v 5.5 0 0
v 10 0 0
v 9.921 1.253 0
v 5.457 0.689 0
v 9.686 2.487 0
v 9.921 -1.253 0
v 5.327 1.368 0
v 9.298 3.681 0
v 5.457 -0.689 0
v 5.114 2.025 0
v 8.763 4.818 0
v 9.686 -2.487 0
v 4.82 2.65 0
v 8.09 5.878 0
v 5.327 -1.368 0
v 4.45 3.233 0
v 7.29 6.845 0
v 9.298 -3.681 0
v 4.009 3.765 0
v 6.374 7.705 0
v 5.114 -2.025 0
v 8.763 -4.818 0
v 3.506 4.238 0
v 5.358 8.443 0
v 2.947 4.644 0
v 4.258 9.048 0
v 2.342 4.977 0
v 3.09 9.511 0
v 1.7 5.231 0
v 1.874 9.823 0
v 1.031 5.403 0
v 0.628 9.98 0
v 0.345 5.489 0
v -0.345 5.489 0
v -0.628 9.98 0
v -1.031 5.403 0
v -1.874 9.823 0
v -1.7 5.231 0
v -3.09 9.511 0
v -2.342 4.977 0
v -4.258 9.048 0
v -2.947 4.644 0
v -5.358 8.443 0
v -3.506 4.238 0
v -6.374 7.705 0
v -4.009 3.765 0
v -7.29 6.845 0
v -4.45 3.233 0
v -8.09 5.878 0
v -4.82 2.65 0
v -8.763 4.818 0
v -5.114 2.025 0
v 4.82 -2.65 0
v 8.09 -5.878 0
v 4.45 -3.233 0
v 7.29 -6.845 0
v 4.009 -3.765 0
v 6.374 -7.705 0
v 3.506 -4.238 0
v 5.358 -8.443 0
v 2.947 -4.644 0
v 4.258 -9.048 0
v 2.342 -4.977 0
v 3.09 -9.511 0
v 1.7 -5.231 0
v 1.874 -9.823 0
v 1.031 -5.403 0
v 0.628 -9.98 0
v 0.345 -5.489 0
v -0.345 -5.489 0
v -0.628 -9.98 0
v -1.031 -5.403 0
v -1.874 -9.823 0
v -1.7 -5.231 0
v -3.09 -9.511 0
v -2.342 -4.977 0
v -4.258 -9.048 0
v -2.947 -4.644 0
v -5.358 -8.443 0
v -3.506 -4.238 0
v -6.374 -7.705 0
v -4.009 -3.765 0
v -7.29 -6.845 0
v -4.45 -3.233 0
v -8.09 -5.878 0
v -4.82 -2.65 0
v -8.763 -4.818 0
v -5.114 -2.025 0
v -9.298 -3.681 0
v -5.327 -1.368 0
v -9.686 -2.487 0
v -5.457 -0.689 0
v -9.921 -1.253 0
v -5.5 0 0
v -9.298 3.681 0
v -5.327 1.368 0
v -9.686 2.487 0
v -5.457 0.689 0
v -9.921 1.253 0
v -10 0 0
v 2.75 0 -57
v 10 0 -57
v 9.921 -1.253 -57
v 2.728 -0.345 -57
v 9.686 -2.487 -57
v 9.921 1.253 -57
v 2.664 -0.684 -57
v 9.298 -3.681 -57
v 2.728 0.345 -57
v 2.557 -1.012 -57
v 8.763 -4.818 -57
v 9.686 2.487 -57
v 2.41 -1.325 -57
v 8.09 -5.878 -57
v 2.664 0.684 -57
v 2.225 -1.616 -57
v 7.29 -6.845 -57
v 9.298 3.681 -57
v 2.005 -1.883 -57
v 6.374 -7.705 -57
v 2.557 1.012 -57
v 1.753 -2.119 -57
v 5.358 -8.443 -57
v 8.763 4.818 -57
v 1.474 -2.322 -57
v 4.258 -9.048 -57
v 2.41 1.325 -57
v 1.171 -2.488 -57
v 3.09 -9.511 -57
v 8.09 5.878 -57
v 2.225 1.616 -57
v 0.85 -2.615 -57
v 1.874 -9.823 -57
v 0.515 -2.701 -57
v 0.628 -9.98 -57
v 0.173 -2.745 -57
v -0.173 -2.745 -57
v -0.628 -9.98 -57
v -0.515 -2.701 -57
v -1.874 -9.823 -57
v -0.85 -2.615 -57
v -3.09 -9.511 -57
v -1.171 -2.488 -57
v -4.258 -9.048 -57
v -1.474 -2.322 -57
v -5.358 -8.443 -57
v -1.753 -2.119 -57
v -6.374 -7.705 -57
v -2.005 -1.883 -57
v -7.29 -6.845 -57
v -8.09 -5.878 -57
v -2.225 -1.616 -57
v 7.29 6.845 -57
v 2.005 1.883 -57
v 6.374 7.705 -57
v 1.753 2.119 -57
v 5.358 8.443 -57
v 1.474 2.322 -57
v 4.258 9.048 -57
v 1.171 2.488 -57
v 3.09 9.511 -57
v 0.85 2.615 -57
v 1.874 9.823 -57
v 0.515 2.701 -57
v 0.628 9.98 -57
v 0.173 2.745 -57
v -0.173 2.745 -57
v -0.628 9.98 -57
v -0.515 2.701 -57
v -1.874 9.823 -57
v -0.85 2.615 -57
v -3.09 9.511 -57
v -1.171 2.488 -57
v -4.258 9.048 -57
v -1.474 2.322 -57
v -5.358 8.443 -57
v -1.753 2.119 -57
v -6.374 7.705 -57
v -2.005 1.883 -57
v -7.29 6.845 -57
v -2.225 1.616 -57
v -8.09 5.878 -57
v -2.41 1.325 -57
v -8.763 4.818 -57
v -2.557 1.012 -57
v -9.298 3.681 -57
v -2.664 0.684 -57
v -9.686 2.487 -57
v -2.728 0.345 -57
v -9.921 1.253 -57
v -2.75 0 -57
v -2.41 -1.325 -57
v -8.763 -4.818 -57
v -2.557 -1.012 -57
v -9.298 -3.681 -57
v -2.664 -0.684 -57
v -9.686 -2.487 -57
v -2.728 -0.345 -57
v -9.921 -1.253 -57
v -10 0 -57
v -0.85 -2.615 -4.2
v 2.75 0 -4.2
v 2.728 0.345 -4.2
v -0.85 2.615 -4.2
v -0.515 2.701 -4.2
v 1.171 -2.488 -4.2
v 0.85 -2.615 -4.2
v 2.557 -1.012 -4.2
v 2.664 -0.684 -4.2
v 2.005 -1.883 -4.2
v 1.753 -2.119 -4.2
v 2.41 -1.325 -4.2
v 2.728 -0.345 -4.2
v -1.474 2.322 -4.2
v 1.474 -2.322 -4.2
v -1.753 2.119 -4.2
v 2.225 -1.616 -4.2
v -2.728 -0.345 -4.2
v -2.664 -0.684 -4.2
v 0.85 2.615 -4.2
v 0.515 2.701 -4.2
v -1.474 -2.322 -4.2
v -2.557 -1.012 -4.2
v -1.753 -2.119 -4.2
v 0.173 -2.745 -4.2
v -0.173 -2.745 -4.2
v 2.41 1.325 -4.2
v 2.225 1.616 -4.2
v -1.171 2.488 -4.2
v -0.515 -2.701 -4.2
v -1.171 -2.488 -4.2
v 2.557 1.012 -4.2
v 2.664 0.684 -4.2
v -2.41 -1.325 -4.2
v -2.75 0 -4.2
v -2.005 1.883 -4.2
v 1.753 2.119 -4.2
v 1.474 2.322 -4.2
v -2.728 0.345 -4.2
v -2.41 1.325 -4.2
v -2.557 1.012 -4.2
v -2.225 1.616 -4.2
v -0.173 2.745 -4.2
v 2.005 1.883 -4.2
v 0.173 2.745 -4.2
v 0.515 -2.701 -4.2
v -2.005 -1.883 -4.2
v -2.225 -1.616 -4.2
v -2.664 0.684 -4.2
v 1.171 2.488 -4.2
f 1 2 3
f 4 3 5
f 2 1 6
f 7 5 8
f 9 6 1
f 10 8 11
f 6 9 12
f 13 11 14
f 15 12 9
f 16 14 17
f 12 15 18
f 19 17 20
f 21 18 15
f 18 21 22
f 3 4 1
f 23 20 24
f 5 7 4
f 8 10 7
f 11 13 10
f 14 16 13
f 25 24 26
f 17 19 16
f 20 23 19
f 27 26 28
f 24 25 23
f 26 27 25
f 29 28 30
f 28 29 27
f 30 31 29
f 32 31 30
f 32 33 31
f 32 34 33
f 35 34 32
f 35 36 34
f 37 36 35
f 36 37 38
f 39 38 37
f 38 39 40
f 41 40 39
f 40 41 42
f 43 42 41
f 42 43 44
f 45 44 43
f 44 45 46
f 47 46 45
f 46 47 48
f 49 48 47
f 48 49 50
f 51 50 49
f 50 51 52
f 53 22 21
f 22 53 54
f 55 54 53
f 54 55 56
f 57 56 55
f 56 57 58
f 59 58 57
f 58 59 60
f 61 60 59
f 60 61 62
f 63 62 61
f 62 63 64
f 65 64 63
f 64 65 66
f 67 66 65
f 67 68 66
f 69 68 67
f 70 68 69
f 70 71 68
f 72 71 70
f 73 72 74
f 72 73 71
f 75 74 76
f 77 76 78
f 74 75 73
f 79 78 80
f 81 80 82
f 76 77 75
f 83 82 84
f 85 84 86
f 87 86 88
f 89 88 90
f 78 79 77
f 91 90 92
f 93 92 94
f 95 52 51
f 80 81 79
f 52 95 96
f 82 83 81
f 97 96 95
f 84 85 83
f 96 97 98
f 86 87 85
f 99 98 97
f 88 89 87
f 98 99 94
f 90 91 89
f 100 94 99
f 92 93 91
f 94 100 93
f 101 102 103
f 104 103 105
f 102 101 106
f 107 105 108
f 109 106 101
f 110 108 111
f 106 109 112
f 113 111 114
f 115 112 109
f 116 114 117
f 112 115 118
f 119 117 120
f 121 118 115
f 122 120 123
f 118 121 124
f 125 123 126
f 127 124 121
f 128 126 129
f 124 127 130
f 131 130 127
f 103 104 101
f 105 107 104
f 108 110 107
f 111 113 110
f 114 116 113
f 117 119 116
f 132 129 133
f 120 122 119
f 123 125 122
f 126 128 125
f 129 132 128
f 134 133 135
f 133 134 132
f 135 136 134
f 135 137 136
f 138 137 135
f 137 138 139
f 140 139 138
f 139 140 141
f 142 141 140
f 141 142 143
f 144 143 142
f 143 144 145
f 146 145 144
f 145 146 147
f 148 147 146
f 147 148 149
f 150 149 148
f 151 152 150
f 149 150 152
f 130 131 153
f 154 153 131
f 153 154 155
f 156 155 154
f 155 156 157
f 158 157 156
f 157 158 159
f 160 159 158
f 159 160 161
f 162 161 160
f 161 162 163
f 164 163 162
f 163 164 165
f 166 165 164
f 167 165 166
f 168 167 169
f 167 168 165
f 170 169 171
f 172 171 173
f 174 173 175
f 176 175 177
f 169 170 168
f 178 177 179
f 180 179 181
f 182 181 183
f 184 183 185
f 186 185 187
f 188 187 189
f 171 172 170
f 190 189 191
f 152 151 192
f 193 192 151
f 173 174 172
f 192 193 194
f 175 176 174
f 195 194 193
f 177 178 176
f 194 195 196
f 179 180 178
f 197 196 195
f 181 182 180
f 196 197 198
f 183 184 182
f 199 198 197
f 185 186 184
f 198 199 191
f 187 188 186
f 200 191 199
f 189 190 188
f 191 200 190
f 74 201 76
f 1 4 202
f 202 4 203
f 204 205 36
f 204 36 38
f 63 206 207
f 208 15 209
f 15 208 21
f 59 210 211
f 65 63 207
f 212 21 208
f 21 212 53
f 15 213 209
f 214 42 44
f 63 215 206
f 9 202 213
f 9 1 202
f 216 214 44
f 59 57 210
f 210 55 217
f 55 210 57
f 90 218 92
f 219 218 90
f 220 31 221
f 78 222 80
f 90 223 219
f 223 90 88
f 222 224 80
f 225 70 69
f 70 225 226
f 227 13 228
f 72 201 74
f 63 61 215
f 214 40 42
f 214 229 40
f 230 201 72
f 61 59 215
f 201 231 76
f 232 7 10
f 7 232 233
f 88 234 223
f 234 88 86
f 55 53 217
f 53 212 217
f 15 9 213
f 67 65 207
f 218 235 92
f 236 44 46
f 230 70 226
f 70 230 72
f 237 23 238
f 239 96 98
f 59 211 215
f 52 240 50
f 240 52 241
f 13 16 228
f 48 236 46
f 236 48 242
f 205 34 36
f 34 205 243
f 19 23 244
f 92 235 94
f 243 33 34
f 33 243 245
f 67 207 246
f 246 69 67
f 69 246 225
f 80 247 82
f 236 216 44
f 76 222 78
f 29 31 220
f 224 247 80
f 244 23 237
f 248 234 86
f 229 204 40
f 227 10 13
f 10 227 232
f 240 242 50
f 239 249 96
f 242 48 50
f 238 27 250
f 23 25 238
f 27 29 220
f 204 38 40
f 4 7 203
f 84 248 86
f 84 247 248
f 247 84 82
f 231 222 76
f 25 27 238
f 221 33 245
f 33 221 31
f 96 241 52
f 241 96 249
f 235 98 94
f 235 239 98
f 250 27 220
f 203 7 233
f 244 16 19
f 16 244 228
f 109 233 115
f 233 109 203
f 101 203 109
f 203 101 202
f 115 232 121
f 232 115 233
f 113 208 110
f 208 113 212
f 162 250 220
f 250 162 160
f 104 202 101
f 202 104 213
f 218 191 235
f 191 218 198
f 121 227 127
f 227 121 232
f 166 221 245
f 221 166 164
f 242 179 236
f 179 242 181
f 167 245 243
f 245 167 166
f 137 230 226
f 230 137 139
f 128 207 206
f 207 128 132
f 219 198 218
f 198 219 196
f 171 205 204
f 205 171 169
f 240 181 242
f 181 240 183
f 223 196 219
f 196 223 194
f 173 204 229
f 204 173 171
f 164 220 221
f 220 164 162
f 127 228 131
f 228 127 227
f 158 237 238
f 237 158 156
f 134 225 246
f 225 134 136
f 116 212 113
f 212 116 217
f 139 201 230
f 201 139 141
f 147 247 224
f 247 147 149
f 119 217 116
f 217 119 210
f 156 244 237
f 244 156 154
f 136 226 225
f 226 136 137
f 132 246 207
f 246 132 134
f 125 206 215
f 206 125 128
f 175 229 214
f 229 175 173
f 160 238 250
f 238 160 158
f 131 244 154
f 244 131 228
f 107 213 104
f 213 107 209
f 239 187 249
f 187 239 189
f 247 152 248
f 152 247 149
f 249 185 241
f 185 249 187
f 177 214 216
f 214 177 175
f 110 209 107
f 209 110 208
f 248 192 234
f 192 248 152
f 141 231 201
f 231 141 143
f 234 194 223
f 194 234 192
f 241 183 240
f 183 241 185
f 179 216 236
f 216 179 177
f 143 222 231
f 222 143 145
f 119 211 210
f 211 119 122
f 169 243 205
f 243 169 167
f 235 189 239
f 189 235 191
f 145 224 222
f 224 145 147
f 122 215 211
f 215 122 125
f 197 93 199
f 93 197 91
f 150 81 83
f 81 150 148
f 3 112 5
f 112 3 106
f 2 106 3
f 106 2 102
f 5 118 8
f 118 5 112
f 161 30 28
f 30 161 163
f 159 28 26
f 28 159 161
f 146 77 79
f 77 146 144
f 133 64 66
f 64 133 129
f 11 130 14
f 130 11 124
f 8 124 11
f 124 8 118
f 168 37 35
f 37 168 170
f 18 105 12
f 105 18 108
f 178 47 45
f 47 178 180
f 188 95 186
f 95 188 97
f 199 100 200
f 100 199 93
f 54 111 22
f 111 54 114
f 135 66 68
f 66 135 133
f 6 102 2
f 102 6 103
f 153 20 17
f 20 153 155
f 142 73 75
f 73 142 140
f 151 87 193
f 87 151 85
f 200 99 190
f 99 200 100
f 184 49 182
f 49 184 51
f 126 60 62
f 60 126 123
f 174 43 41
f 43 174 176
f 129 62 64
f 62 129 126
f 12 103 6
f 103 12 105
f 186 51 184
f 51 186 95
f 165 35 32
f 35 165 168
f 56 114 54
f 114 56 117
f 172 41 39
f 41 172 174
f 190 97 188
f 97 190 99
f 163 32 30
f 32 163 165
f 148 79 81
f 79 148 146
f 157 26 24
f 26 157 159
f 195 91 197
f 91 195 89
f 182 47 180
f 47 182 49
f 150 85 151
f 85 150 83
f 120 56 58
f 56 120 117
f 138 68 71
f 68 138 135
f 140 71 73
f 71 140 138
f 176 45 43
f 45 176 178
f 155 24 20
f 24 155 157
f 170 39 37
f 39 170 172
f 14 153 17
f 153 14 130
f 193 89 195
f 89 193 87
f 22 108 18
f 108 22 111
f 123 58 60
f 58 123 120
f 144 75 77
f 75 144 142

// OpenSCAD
$fn = 50;


difference() {
	union() {
		translate(v = [0, 0, -57.0000000000]) {
			cylinder(h = 57, r = 10.0000000000);
		}
		cylinder(h = 0, r = 19.0000000000);
	}
	union() {
		translate(v = [0, 0, 0]) {
			rotate(a = [0, 0, 0]) {
				difference() {
					union() {
						#translate(v = [0, 0, -57.0000000000]) {
							cylinder(h = 57, r = 2.2500000000);
						}
						#translate(v = [0, 0, -4.2000000000]) {
							cylinder(h = 4.2000000000, r = 10.0000000000, r1 = 2.7500000000, r2 = 5.5000000000);
						}
						#translate(v = [0, 0, -57.0000000000]) {
							cylinder(h = 57, r = 2.7500000000);
						}
						#translate(v = [0, 0, -57.0000000000]) {
							cylinder(h = 57, r = 2.2500000000);
						}
					}
					union();
				}
			}
		}
	}
}
